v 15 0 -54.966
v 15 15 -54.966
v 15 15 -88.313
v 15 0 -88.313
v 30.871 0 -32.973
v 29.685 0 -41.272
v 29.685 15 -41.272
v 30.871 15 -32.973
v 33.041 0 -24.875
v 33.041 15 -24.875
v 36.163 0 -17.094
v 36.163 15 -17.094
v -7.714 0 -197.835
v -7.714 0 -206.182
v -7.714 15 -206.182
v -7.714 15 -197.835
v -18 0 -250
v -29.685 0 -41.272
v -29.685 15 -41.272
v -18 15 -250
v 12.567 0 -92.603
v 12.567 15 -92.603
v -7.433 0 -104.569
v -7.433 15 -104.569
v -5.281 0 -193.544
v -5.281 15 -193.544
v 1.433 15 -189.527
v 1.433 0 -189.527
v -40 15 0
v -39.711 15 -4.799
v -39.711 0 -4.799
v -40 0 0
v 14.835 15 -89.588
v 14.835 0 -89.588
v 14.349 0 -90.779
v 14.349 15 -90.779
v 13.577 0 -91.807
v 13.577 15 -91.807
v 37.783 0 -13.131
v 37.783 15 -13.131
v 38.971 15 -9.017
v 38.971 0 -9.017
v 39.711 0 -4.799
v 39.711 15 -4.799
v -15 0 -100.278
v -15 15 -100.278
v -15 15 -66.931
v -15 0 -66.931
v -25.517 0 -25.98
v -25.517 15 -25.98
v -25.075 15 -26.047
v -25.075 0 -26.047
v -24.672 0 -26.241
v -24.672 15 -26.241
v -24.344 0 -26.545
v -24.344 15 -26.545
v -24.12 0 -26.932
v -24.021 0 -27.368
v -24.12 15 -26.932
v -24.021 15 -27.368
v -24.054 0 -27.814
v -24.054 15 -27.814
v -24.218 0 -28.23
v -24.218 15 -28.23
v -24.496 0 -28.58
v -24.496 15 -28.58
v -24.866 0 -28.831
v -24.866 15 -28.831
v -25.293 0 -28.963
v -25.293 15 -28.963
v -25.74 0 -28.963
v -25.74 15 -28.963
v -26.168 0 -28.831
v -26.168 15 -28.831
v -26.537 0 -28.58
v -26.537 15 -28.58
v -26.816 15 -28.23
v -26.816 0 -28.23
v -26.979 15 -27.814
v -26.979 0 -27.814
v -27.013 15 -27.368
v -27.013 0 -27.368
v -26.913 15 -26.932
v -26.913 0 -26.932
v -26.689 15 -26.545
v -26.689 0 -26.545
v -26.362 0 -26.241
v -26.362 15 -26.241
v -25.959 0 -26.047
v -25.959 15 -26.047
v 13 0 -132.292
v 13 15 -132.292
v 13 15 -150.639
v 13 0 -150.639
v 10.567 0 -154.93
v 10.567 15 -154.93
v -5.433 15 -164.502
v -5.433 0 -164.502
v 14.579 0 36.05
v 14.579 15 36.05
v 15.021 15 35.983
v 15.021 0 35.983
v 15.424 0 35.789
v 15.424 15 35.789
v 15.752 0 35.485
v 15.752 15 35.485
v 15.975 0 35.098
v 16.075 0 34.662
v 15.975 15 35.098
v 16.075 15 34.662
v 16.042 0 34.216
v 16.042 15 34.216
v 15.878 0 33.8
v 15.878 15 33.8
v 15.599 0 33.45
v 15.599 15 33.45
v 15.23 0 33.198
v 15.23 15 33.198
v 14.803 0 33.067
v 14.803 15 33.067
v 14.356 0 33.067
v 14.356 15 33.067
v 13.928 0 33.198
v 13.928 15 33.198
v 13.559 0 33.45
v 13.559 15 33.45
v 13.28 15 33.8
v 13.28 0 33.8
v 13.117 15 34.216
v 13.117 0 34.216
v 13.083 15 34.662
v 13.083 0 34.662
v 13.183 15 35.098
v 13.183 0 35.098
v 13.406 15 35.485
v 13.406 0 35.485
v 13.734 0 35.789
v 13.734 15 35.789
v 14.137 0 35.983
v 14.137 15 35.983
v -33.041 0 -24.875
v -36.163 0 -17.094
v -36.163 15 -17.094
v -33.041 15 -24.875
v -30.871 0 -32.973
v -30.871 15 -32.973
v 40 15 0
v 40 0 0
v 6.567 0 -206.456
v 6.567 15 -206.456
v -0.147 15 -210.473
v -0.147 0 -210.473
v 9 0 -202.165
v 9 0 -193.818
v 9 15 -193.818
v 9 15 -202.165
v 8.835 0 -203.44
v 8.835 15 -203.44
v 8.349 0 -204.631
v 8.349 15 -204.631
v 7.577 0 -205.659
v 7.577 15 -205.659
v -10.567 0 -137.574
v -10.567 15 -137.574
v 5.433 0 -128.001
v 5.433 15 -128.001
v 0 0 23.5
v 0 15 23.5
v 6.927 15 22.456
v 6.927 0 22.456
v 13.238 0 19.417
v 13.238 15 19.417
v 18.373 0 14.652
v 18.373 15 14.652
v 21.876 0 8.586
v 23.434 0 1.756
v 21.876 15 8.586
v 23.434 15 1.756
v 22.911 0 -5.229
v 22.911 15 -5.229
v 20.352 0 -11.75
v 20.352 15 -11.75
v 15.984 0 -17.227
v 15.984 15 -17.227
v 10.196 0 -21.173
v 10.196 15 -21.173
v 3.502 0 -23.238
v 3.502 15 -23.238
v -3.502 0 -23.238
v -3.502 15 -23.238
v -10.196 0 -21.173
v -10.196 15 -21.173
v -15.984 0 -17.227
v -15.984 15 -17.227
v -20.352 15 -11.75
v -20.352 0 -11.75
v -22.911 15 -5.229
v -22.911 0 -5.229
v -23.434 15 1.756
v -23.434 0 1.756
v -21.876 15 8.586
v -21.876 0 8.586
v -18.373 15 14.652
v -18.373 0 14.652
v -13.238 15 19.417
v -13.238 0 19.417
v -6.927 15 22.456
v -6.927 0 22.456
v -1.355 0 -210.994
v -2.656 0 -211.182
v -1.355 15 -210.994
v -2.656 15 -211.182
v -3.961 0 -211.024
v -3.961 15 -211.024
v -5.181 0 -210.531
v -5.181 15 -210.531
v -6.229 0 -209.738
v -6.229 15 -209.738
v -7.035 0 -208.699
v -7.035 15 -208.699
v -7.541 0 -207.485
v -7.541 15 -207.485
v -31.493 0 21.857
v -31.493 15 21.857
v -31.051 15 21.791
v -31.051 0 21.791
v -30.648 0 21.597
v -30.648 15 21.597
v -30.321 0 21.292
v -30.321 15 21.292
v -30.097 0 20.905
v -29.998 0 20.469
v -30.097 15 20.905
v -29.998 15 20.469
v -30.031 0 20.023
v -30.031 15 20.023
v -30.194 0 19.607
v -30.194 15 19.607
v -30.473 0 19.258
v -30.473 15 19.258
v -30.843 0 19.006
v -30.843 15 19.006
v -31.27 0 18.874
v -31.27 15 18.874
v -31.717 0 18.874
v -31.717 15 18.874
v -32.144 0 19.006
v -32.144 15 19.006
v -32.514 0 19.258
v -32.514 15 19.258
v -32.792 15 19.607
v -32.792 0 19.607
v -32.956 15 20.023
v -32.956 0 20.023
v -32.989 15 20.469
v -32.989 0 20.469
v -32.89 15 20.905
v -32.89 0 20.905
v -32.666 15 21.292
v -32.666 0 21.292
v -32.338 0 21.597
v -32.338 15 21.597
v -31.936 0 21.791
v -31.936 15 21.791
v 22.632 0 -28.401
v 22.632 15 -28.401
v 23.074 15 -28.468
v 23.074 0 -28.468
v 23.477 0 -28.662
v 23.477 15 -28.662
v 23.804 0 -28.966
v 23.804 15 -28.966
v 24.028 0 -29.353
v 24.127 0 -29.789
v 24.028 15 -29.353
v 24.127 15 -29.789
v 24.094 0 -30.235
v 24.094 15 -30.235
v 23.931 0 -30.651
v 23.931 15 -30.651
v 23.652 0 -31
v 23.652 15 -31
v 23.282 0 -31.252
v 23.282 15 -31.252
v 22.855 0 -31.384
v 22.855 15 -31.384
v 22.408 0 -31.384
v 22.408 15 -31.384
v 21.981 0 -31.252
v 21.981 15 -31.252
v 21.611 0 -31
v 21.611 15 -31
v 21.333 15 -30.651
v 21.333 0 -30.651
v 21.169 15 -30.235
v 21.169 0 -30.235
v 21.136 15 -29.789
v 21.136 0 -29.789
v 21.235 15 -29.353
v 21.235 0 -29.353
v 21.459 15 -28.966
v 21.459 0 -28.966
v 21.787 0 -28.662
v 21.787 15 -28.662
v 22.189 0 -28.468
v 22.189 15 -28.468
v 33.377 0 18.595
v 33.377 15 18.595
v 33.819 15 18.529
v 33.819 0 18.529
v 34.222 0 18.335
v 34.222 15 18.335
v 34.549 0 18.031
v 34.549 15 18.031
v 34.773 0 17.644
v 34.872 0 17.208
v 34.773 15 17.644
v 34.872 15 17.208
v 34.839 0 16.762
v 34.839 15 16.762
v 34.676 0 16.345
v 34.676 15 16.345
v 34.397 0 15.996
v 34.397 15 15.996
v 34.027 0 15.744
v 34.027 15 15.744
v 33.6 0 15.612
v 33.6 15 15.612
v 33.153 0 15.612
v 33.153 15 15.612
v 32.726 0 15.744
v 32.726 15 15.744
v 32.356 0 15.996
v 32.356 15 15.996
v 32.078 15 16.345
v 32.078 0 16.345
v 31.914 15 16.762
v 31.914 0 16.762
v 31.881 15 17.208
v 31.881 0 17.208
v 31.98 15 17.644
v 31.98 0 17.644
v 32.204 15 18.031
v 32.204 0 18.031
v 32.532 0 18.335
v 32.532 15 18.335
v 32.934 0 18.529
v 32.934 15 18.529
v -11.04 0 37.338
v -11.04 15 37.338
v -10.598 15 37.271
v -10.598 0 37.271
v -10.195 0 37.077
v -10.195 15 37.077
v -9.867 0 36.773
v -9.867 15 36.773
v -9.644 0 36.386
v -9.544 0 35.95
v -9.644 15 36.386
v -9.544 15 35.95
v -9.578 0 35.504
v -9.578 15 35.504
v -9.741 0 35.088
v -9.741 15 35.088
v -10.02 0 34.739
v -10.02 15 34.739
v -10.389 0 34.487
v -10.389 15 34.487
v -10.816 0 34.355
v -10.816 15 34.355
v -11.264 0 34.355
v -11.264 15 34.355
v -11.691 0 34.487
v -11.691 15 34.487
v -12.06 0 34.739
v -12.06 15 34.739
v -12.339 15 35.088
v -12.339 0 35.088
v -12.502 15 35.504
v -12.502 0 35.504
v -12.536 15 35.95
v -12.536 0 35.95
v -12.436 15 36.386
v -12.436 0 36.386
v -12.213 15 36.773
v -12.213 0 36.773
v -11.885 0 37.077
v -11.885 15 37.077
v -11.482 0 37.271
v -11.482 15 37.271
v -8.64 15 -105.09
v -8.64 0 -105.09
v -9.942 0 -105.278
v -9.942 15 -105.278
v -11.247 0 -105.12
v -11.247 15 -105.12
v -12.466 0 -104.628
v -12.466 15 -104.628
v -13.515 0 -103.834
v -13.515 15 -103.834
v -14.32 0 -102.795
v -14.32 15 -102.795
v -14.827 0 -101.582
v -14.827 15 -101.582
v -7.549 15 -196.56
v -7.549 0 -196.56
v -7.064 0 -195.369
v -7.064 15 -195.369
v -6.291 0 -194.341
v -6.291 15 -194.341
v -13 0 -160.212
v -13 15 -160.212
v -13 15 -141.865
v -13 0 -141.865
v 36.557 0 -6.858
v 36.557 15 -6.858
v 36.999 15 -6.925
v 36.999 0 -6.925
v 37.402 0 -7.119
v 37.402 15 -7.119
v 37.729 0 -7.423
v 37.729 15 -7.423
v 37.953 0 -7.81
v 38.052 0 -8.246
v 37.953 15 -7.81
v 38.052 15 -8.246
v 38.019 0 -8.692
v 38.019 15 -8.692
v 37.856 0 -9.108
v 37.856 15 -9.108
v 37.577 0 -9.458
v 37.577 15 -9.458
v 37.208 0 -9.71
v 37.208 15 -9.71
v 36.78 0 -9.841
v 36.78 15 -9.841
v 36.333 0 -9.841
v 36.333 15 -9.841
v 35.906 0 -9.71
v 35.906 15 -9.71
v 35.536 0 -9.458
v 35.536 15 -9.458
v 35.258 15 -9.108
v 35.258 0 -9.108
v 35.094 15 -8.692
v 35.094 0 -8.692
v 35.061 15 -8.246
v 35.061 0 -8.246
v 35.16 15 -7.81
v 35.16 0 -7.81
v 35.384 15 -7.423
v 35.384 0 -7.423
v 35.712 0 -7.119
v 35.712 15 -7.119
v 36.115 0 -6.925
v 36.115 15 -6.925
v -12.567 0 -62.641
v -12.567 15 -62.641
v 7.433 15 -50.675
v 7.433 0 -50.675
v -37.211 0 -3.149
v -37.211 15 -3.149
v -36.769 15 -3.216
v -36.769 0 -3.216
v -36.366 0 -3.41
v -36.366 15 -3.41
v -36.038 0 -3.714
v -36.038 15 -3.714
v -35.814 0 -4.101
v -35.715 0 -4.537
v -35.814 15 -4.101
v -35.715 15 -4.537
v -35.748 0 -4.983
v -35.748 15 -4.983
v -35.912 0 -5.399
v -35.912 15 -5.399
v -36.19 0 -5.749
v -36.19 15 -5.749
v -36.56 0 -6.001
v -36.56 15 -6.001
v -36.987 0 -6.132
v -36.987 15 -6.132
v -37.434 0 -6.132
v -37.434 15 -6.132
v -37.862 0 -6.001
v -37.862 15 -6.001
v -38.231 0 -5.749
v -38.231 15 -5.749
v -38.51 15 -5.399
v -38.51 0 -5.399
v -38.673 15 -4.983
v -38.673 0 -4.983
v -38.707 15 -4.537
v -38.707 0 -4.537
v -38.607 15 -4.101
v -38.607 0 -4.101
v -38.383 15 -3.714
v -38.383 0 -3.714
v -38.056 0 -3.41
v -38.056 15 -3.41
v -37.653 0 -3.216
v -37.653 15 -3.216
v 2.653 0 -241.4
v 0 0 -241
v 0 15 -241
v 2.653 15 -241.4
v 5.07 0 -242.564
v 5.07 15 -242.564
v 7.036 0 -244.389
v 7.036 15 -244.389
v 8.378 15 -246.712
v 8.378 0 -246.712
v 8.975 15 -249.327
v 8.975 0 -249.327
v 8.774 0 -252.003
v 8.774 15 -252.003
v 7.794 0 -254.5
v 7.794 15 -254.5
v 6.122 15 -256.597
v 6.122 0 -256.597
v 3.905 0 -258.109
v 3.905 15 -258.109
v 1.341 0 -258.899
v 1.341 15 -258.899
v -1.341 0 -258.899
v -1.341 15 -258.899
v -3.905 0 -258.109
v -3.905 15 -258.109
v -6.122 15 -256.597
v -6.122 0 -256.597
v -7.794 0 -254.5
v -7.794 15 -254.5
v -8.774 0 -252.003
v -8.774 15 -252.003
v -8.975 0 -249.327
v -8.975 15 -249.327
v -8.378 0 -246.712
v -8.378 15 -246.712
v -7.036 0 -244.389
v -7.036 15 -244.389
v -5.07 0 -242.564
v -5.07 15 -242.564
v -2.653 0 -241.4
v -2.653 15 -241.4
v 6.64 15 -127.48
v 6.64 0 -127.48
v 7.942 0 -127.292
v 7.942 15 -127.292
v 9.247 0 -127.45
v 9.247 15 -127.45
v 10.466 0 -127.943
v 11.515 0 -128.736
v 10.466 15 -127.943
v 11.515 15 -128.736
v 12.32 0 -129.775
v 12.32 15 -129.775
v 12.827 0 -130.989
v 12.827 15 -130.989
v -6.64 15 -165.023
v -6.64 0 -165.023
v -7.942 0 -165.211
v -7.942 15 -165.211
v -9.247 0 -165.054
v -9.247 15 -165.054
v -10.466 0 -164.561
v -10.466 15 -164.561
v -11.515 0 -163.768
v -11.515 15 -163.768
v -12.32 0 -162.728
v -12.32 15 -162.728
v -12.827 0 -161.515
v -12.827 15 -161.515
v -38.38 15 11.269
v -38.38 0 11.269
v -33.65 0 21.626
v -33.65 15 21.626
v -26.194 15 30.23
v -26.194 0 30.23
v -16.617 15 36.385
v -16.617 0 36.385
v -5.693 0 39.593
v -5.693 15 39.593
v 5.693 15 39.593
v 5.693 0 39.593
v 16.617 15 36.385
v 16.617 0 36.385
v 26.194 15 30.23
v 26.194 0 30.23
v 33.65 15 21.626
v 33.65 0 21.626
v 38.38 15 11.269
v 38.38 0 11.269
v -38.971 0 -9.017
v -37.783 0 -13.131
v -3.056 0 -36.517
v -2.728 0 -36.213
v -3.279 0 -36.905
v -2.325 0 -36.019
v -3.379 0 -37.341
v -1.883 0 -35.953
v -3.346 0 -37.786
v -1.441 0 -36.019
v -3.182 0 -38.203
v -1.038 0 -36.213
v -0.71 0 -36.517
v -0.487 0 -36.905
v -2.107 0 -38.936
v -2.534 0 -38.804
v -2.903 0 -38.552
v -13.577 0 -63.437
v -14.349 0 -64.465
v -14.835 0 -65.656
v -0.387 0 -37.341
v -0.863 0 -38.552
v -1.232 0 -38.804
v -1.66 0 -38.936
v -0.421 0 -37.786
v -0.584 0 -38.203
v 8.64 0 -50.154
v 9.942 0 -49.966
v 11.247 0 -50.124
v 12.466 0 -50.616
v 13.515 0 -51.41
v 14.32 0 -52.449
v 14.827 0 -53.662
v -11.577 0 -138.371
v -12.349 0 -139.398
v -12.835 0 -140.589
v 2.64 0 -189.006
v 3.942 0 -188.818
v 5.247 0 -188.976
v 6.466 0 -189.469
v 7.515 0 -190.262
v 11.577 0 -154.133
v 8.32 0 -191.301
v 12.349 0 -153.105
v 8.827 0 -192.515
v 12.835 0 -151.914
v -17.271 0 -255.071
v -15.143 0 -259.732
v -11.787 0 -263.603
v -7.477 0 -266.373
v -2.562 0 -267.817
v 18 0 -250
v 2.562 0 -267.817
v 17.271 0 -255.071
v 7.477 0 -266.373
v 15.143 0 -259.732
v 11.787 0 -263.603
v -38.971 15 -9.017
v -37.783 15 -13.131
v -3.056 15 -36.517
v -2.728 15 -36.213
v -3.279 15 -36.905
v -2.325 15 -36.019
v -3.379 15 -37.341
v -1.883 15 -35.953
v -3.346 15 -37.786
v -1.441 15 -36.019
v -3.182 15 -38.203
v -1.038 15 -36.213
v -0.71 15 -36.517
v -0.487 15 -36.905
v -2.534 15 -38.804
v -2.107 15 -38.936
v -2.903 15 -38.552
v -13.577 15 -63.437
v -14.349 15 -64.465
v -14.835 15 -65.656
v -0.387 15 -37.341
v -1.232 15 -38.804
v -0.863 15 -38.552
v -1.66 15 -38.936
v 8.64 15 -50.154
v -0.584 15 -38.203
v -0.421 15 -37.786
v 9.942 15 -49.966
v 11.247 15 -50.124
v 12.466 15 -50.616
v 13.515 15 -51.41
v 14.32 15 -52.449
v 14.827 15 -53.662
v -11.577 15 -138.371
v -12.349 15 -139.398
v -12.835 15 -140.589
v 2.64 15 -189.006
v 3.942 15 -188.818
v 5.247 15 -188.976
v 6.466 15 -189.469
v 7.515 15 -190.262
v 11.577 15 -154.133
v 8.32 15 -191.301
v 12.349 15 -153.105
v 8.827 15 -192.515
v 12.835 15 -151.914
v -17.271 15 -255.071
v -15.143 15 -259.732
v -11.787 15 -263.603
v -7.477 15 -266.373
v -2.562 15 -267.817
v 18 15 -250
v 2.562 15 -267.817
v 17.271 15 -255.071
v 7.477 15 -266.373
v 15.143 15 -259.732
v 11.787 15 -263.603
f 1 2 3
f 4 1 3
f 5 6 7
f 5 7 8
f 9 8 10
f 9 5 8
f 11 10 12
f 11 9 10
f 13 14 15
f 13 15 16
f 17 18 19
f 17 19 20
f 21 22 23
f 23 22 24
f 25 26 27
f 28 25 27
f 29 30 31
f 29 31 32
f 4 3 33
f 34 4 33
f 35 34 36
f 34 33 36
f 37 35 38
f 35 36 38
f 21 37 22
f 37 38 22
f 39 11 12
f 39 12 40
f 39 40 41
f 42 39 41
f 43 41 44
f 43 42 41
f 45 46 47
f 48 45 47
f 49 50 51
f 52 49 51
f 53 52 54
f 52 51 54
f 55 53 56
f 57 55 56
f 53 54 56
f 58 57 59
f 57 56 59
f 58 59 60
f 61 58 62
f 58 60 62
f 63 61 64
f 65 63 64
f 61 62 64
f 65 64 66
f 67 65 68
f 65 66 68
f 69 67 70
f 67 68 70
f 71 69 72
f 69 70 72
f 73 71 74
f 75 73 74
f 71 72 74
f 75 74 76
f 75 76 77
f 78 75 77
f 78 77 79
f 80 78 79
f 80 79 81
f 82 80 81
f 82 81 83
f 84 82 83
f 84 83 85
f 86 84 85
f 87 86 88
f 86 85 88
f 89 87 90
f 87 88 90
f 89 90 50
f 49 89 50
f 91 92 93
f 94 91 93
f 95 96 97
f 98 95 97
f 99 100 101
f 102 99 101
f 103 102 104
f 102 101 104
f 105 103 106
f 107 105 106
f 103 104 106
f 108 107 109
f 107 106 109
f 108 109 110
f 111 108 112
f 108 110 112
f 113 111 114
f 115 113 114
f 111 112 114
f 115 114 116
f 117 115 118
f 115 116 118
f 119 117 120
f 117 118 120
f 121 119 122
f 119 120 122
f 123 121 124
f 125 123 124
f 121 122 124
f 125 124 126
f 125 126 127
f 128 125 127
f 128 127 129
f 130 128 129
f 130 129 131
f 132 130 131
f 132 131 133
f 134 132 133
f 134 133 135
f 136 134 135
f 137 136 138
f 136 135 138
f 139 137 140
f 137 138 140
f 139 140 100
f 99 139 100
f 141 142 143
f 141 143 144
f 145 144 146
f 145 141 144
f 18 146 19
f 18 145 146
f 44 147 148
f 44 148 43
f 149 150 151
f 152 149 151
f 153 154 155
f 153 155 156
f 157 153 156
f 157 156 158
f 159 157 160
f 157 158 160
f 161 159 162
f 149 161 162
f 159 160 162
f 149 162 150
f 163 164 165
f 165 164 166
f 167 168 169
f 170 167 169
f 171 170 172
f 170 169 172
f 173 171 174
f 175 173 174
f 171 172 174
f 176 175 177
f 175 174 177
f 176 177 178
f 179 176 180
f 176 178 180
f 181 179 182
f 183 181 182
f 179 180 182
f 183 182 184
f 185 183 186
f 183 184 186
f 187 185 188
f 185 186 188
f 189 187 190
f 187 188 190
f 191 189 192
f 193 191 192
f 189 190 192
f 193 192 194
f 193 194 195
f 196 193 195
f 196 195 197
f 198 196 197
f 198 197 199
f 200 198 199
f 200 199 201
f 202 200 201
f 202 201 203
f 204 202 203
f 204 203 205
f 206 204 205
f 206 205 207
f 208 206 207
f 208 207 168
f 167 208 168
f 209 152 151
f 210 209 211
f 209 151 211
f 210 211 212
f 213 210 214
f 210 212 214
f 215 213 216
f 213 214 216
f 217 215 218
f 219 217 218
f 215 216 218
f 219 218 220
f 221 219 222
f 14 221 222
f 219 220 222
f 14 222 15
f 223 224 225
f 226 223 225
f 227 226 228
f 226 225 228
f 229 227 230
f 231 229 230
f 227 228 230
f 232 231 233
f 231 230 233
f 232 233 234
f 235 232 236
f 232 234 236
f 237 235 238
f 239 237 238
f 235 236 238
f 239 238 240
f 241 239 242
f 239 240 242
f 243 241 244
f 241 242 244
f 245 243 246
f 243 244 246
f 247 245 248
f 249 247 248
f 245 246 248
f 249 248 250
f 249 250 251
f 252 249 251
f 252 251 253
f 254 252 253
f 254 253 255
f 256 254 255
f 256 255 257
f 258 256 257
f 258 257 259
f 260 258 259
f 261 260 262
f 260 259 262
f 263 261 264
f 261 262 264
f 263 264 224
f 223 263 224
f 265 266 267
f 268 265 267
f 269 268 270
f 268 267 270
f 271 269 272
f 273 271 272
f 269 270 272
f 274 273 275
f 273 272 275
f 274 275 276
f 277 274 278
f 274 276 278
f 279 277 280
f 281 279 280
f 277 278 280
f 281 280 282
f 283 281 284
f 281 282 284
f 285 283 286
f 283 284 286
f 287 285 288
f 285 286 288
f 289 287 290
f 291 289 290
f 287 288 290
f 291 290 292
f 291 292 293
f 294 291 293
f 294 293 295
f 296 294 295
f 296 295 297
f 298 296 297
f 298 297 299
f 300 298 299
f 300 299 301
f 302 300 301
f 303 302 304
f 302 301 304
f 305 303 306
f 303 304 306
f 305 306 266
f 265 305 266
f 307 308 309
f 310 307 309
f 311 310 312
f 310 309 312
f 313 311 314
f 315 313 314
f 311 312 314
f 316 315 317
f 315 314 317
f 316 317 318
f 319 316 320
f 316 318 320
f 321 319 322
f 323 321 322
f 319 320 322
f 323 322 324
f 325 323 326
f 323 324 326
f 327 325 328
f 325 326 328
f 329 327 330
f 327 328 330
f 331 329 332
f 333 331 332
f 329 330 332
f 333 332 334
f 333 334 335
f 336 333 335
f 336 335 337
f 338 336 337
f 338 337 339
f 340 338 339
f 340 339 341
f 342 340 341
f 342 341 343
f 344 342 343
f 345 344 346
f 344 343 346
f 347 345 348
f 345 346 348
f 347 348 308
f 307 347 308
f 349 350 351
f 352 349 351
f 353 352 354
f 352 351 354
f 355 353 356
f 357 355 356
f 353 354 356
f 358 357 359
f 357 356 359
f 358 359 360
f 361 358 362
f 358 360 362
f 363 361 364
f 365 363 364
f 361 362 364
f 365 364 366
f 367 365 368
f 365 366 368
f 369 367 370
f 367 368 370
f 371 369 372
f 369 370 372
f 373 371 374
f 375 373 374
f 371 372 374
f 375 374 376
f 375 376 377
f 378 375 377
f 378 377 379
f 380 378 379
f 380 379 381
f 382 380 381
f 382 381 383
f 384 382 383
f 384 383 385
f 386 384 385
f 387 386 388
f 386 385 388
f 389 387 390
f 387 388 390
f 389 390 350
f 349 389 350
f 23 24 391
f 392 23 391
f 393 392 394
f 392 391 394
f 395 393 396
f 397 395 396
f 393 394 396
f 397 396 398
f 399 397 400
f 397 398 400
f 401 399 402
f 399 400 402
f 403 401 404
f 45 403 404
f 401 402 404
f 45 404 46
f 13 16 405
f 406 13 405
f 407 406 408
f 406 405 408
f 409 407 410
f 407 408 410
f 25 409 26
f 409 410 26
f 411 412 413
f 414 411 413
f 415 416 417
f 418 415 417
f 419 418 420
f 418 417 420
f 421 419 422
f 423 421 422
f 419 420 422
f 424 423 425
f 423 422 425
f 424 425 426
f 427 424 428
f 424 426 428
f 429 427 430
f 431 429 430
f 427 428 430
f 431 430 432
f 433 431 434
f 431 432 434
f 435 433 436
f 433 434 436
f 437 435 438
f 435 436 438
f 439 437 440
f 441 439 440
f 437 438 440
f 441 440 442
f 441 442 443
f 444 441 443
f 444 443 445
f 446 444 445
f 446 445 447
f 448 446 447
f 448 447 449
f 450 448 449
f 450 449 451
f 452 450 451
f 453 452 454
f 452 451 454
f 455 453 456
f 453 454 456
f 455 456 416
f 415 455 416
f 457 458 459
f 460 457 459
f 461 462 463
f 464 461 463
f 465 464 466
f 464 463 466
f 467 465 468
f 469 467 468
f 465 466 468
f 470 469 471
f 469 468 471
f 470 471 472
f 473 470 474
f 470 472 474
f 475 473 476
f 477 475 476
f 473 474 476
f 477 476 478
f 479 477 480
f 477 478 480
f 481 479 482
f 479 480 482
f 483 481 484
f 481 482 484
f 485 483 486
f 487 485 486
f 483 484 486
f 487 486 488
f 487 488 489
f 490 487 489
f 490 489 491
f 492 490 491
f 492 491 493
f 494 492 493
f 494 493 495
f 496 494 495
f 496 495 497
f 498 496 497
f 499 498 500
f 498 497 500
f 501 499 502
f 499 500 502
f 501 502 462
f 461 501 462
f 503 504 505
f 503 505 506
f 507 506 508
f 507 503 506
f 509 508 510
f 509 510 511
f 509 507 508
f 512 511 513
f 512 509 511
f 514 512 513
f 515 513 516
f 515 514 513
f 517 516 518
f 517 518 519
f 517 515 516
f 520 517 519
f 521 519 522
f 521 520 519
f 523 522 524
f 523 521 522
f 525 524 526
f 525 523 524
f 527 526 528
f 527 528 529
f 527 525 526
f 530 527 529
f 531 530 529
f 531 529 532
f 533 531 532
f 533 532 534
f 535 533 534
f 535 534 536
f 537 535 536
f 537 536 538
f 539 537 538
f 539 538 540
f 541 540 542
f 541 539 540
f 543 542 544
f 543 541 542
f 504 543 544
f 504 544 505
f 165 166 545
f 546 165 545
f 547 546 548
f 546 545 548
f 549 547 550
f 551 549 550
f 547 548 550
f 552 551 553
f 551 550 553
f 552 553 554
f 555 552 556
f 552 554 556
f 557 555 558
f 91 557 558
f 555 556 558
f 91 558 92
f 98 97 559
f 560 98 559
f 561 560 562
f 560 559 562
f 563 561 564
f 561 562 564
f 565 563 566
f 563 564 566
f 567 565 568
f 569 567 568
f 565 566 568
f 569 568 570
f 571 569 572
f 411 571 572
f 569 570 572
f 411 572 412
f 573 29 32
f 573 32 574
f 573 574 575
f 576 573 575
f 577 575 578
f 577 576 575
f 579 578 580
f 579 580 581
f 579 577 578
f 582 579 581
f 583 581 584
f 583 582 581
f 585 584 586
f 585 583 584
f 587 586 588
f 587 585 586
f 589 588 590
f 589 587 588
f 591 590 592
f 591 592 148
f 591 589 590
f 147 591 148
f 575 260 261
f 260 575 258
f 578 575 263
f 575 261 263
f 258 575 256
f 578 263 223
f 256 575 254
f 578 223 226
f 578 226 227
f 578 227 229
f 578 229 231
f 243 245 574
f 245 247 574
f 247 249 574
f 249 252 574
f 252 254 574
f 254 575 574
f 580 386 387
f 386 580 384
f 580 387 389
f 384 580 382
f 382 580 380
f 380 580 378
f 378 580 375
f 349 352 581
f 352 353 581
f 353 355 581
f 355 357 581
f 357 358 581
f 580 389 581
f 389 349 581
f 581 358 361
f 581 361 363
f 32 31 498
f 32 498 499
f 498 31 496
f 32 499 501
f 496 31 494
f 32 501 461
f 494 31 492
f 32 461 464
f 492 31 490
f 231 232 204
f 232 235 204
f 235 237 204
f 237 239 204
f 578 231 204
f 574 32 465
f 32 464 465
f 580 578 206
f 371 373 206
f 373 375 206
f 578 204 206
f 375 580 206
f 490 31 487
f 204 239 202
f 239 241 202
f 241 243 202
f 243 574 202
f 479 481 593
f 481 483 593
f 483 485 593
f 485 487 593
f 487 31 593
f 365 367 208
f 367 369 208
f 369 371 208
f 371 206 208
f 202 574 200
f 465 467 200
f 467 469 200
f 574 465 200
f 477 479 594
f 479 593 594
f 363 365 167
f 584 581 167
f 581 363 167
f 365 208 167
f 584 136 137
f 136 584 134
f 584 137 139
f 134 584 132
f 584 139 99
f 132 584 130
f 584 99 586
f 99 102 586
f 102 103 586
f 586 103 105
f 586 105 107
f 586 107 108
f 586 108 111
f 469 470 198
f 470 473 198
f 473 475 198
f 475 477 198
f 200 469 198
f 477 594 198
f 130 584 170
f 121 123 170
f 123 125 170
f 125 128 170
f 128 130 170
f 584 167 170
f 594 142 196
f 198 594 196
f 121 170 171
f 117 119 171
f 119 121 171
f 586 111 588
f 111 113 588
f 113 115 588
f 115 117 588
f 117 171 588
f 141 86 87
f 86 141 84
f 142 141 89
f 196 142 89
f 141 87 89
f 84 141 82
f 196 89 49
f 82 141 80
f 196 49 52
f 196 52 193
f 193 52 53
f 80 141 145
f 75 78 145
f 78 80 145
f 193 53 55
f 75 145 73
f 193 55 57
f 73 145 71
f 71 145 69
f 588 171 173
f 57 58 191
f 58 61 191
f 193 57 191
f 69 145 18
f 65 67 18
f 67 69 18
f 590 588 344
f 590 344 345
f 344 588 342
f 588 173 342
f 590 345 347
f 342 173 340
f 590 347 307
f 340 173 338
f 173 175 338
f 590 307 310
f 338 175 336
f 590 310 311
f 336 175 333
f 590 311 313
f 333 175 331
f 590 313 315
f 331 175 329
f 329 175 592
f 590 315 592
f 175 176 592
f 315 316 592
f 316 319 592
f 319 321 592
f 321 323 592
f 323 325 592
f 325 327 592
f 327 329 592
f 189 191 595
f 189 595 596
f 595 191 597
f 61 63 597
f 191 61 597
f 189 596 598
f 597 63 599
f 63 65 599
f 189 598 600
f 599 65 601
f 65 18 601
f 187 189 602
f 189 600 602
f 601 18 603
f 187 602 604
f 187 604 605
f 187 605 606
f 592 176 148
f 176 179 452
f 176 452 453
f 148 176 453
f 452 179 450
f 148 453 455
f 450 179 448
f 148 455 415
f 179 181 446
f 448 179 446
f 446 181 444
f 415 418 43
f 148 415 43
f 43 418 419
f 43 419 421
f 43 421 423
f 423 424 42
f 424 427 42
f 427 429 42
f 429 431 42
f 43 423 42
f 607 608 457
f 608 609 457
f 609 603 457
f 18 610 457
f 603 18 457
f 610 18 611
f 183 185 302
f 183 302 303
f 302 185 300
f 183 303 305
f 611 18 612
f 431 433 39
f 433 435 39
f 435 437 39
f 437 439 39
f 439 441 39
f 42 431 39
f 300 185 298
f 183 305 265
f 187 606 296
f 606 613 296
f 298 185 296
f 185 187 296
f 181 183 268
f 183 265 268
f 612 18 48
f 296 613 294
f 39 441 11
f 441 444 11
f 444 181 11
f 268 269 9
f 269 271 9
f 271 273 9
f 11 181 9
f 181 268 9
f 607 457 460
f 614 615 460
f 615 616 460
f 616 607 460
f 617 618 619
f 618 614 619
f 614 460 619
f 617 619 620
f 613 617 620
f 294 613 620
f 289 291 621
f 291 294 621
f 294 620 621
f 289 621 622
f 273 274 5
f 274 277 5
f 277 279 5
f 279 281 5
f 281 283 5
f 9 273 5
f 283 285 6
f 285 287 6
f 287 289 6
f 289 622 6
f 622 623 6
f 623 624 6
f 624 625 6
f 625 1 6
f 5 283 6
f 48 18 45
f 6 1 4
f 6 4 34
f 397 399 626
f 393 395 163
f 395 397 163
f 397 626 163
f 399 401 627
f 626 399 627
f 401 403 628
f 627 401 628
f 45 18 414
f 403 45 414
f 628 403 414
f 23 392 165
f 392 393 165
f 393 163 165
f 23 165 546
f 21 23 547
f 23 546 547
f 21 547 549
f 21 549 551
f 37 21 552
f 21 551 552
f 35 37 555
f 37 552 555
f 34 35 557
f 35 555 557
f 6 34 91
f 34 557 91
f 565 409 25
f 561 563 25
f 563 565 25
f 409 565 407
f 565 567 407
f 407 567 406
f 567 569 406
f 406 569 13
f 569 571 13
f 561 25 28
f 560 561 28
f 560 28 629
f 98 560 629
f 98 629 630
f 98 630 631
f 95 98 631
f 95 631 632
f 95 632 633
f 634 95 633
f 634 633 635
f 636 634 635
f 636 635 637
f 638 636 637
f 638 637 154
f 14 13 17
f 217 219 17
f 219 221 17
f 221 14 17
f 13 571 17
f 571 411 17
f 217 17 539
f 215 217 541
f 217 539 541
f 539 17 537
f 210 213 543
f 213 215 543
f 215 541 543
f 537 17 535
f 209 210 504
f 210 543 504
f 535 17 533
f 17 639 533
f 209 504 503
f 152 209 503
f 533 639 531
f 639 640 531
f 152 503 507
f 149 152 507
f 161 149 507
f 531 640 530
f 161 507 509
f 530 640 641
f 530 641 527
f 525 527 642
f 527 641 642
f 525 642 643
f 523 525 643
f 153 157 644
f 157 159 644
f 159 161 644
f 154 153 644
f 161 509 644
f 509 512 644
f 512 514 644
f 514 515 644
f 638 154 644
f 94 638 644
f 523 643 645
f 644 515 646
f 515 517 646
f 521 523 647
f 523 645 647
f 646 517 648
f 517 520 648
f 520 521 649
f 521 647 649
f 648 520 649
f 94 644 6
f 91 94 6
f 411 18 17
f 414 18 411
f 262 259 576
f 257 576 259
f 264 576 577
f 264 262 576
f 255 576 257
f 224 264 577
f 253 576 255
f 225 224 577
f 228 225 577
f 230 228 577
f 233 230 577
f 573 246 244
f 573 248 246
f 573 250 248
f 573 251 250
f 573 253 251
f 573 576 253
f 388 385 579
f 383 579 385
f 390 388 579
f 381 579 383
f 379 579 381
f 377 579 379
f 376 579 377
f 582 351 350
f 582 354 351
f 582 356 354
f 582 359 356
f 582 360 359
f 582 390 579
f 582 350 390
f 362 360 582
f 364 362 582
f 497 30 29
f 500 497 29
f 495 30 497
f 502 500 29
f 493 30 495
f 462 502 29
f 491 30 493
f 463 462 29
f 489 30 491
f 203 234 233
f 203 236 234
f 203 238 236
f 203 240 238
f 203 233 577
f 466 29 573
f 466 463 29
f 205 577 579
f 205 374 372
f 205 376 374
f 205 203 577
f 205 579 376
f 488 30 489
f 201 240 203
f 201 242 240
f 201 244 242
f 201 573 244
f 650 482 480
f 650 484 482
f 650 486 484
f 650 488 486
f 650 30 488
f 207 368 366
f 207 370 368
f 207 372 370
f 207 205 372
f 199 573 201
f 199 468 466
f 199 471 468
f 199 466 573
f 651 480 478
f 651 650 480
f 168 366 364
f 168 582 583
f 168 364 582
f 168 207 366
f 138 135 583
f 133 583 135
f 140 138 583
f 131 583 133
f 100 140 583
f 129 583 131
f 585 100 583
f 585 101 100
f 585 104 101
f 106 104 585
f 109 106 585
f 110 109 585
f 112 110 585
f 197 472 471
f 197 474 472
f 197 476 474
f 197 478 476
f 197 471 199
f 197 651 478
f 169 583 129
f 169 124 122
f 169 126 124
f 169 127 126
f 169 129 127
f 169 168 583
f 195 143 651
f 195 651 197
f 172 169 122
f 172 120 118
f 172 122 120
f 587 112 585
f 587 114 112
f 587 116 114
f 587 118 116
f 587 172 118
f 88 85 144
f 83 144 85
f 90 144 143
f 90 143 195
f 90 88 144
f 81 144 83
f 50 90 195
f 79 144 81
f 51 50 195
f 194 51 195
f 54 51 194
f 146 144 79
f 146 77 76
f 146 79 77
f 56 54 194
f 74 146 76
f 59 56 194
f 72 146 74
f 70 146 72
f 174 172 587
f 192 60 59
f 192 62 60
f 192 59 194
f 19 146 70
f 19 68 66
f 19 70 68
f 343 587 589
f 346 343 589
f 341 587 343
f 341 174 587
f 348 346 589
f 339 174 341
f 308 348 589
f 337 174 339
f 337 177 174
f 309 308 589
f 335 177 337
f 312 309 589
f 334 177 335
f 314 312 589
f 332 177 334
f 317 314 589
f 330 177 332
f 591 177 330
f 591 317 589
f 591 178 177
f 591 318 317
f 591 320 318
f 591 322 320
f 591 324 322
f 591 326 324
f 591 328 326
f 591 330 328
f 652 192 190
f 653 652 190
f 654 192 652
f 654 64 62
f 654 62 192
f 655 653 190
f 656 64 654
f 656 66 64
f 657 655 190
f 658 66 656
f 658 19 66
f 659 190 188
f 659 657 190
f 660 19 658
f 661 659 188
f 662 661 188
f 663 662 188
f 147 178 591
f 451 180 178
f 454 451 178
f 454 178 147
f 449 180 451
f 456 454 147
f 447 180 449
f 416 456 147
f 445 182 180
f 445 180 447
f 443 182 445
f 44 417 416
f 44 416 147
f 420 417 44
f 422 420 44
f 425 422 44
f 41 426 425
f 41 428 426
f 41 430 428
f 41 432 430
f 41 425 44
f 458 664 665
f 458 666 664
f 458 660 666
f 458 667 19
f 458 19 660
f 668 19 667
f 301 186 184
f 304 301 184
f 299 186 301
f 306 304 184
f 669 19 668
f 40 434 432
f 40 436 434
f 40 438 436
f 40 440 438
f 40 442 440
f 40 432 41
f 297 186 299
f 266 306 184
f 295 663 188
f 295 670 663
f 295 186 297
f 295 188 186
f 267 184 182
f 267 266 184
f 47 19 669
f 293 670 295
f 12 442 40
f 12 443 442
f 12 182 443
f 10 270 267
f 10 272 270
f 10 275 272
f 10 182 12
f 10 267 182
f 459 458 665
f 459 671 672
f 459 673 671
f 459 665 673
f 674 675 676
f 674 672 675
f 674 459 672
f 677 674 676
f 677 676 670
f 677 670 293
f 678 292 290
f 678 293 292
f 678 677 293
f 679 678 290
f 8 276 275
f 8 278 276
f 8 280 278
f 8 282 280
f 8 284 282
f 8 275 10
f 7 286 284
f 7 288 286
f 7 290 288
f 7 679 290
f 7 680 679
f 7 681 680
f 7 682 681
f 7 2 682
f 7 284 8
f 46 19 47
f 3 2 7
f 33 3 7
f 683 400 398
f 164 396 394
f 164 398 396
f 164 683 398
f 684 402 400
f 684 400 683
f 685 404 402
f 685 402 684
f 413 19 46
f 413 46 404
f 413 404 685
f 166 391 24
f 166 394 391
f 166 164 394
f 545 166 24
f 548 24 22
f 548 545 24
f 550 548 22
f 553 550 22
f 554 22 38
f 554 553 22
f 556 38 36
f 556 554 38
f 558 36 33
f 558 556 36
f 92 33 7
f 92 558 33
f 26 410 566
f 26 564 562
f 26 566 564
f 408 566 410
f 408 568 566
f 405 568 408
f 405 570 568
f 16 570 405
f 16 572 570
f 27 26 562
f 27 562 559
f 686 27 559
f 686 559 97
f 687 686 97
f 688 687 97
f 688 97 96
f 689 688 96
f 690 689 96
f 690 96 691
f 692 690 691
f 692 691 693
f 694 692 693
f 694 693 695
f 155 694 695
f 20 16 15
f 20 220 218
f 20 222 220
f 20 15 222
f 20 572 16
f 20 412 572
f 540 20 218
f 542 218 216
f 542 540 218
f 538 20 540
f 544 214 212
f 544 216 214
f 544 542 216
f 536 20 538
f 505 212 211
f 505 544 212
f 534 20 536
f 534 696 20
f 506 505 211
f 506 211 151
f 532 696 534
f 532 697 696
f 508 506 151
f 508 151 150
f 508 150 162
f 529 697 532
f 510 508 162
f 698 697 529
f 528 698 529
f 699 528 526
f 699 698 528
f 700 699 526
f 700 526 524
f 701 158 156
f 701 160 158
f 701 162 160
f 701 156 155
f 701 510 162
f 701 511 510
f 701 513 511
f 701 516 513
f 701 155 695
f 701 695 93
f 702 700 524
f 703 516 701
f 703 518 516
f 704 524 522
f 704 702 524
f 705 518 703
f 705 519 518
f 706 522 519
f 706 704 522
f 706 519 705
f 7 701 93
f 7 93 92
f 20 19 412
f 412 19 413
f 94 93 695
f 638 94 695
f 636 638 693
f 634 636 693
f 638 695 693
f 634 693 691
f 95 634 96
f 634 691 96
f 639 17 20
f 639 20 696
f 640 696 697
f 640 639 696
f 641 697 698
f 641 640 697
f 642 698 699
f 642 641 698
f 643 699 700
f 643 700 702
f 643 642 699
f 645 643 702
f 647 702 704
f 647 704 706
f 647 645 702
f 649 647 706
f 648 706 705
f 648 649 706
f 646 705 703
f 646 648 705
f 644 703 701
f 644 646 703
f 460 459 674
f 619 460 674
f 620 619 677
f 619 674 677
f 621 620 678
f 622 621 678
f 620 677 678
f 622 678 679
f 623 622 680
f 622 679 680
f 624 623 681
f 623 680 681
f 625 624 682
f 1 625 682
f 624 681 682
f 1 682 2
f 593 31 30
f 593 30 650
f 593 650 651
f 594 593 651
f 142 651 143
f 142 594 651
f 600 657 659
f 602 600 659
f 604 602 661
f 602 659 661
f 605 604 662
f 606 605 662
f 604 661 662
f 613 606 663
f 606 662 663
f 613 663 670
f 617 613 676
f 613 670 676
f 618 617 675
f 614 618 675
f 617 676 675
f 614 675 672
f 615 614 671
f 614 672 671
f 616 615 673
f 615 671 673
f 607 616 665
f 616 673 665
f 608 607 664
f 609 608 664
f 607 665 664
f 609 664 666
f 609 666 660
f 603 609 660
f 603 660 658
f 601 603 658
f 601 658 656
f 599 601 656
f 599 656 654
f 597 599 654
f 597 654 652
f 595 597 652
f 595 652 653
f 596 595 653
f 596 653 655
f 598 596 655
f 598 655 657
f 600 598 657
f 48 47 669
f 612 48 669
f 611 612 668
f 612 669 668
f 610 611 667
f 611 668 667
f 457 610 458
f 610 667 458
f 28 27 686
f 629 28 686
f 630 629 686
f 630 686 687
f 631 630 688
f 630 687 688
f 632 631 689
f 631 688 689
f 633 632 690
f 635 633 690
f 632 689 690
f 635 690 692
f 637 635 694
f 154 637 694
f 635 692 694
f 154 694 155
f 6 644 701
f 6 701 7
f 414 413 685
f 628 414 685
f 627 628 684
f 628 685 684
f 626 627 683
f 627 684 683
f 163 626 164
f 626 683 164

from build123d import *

# Parameters (mm, degrees)
SKETCH_1_R          = 5.05
SKETCH_1_R_2        = 13
EXTRUDE_1_DEPTH     = 15
FILLET_1_R          = 3
SKETCH_7_R          = 2.05
CUT_EXTRUDE_4_DEPTH = 277.54113618
SKETCH_8_R          = 13
CUT_EXTRUDE_5_DEPTH = 277.54113618
SKETCH_9_R          = 25
SKETCH_9_R_2        = 13
EXTRUDE_4_DEPTH     = 15
SKETCH_10_R         = 1.5
EXTRUDE_5_DEPTH     = 15
EXTRUDE_START       = -15
SKETCH_14_R         = 13
SKETCH_14_R_2       = 9
EXTRUDE_6_DEPTH     = 15
SKETCH_13_R         = 23.5
SKETCH_13_R_2       = 1.5
CUT_EXTRUDE_6_DEPTH = 25
CUT_EXTRUDE_START   = -15
CUT_EXTRUDE_7_DEPTH = 15
EXTRUDE_9_DEPTH     = 15
CUT_EXTRUDE_8_DEPTH = 30


# Read off the part's stored shape, not the designer's step: 切除-拉伸7
with BuildPart() as part:
    # 草图1 → 凸台-拉伸1 (new body)
    with BuildSketch(Plane(origin=(0, 0, 0), x_dir=(1, 0, 0), z_dir=(0, 1, 0))):
        with BuildLine():
            Line((-17.992942616, -0.504), (-24.990198078, 249.3))
            ThreePointArc((-24.990198078, 249.3), (0, 275), (24.990198078, 249.3))
            Line((24.990198078, 249.3), (17.992942616, -0.504))
            ThreePointArc((17.992942616, -0.504), (0, -18), (-17.992942616, -0.504))
        make_face()
        with Locations(Location((0, 0, 0), (0, 0, 270))):
            Circle(SKETCH_1_R, mode=Mode.SUBTRACT)
        with Locations(Location((0, 250, 0), (0, 0, 270))):
            Circle(SKETCH_1_R_2, mode=Mode.SUBTRACT)
        Polygon((-16.444447487, 158.5), (-17.704941698, 203.5), (11.028871219, 137.174942267), align=None, mode=Mode.SUBTRACT)
        Polygon((15.954255294, 141), (18.475243716, 231), (-12, 219.5), align=None, mode=Mode.SUBTRACT)
    extrude(amount=EXTRUDE_1_DEPTH)

    # 圆角1
    fillet_1_edges = [part.edges().sort_by_distance(p)[0] for p in [
        (-16.444447487, 7.5, -158.5),
        (11.028871219, 7.5, -137.174942267),
        (-17.704941698, 7.5, -203.5),
        (18.475243716, 7.5, -231),
        (-12, 7.5, -219.5),
        (15.954255294, 7.5, -141),
    ]]
    fillet(fillet_1_edges, radius=FILLET_1_R)

    # 草图7 → 切除-拉伸4 (cut, through all)
    with BuildSketch(Plane(origin=(0, 15, 0), x_dir=(1, 0, 0), z_dir=(0, 1, 0))):
        with Locations(Location((15, 15, 0), (0, 0, 270))):
            Circle(SKETCH_7_R)
        with Locations(Location((-15, 15, 0), (0, 0, 270))):
            Circle(SKETCH_7_R)
        with Locations((-15, -15)):
            Circle(SKETCH_7_R)
        with Locations((15, -15)):
            Circle(SKETCH_7_R)
    extrude(amount=-CUT_EXTRUDE_4_DEPTH, mode=Mode.SUBTRACT)

    # 草图8 → 切除-拉伸5 (cut, through all)
    with BuildSketch(Plane(origin=(0, 15, 0), x_dir=(1, 0, 0), z_dir=(0, 1, 0))):
        with Locations(Location((0, 0, 0), (0, 0, 270))):
            Circle(SKETCH_8_R)
    extrude(amount=-CUT_EXTRUDE_5_DEPTH, mode=Mode.SUBTRACT)

    # 草图9 → 凸台-拉伸4 (add)
    with BuildSketch(Plane(origin=(0, 15, 0), x_dir=(1, 0, 0), z_dir=(0, 1, 0))):
        Circle(SKETCH_9_R)
        with Locations(Location((0, 0, 0), (0, 0, 270))):
            Circle(SKETCH_9_R_2, mode=Mode.SUBTRACT)
    extrude(amount=-EXTRUDE_4_DEPTH)

    # 草图10 → 凸台-拉伸5 (add)
    with BuildSketch(Plane(origin=(0, 15, 0), x_dir=(1, 0, 0), z_dir=(0, 1, 0))):
        with BuildLine():
            Line((-39.711049207, 4.799226071), (-40, 0))
            ThreePointArc((-40, 0), (0, -40), (40, 0))
            Line((40, 0), (39.711049207, 4.799226071))
            Line((39.711049207, 4.799226071), (24.990198078, 249.3))
            Line((24.990198078, 249.3), (18.993134598, 35.203136766))
            Line((18.993134598, 35.203136766), (18.478724461, 16.838549294))
            ThreePointArc((18.478724461, 16.838549294), (0, -25), (-18.478724461, 16.838549294))
            Line((-18.478724461, 16.838549294), (-18.993134598, 35.203136766))
            Line((-18.993134598, 35.203136766), (-24.990198078, 249.3))
            Line((-24.990198078, 249.3), (-39.711049207, 4.799226071))
        make_face()
        with Locations(Location((-31.493406412, -20.357194124, 0), (0, 0, 270))):
            Circle(SKETCH_10_R, mode=Mode.SUBTRACT)
        with Locations(Location((-37.210701127, 4.649055992, 0), (0, 0, 270))):
            Circle(SKETCH_10_R, mode=Mode.SUBTRACT)
        with Locations(Location((-25.516695234, 27.479961141, 0), (0, 0, 270))):
            Circle(SKETCH_10_R, mode=Mode.SUBTRACT)
        with Locations(Location((-11.039996826, -35.838086864, 0), (0, 0, 270))):
            Circle(SKETCH_10_R, mode=Mode.SUBTRACT)
        with Locations(Location((14.579149971, -34.549940465, 0), (0, 0, 270))):
            Circle(SKETCH_10_R, mode=Mode.SUBTRACT)
        with Locations(Location((33.376550467, -17.095492942, 0), (0, 0, 270))):
            Circle(SKETCH_10_R, mode=Mode.SUBTRACT)
        with Locations(Location((22.631551157, 29.900884473, 0), (0, 0, 270))):
            Circle(SKETCH_10_R, mode=Mode.SUBTRACT)
        with Locations(Location((36.55669206, 8.358125723, 0), (0, 0, 270))):
            Circle(SKETCH_10_R, mode=Mode.SUBTRACT)
    extrude(amount=-EXTRUDE_5_DEPTH)

    # 草图14 → 凸台-拉伸6 (add)
    with BuildSketch(Plane(origin=(0, 15, 0), x_dir=(1, 0, 0), z_dir=(0, 1, 0)).offset(EXTRUDE_START)):
        with Locations((0, 250)):
            Circle(SKETCH_14_R)
        with Locations(Location((0, 250, 0), (0, 0, 270))):
            Circle(SKETCH_14_R_2, mode=Mode.SUBTRACT)
    extrude(amount=EXTRUDE_6_DEPTH)

    # 草图13 → 切除-拉伸6 (cut)
    with BuildSketch(Plane(origin=(0, 15, 0), x_dir=(1, 0, 0), z_dir=(0, 1, 0))):
        with Locations(Location((0, 0, 0), (0, 0, 270))):
            Circle(SKETCH_13_R)
        with Locations(Location((-1.883144055, 37.452687066, 0), (0, 0, 270))):
            Circle(SKETCH_13_R_2)
    extrude(amount=-CUT_EXTRUDE_6_DEPTH, mode=Mode.SUBTRACT)

    # 切除-拉伸7 outline → 切除-拉伸7 (cut)
    with BuildSketch(Plane(origin=(0, 15, 0), x_dir=(1, 0, 0), z_dir=(0, 1, 0)).offset(CUT_EXTRUDE_START)):
        with BuildLine():
            ThreePointArc((-39.711049207, 4.799226071), (-38.432072473, 11.089445679), (-36.163406358, 17.094093734))
            ThreePointArc((-36.163406358, 17.094093734), (-31.834646693, 28.891099747), (-29.684840552, 41.271965817))
            Line((-29.684840552, 41.271965817), (-18, 250))
            ThreePointArc((-18, 250), (0, 268), (18, 250))
            Line((18, 250), (29.684856444, 41.271998774))
            ThreePointArc((29.684856444, 41.271998774), (31.834654407, 28.891107358), (36.163414547, 17.09407641))
            ThreePointArc((36.163414547, 17.09407641), (38.432075129, 11.089436474), (39.711049207, 4.799226071))
            Line((39.711049207, 4.799226071), (24.990198078, 249.3))
            ThreePointArc((24.990198078, 249.3), (0, 275), (-24.990198078, 249.3))
            Line((-24.990198078, 249.3), (-39.711049207, 4.799226071))
        make_face()
    extrude(amount=CUT_EXTRUDE_7_DEPTH, mode=Mode.SUBTRACT)

    # 草图18 → 凸台-拉伸9 (add)
    with BuildSketch(Plane(origin=(0, 0, 0), x_dir=(-1, 0, 0), z_dir=(0, -1, 0))):
        Polygon((-20.868155543, 131.844626328), (20.706902291, 152.097209515), (16.905995412, 230.591726078), (-18.51031166, 232.603381148), (-19.336560971, 196.02914685), align=None)
    extrude(amount=-EXTRUDE_9_DEPTH)

    # 草图19 → 切除-拉伸8 (cut)
    with BuildSketch(Plane(origin=(0, 15, 0), x_dir=(1, 0, 0), z_dir=(0, 1, 0))):
        with BuildLine():
            Line((-7.714285714, 206.181987904), (-7.714285714, 197.835106113))
            ThreePointArc((-7.714285714, 197.835106113), (-7.063735021, 195.368876049), (-5.281369423, 193.544409057))
            Line((-5.281369423, 193.544409057), (1.432916291, 189.52731504))
            ThreePointArc((1.432916291, 189.52731504), (6.466230064, 189.468562789), (9, 193.818012096))
            Line((9, 193.818012096), (9, 202.164893887))
            ThreePointArc((9, 202.164893887), (8.349449307, 204.631123951), (6.567083709, 206.455590943))
            Line((6.567083709, 206.455590943), (-0.147202005, 210.47268496))
            ThreePointArc((-0.147202005, 210.47268496), (-5.180515778, 210.531437211), (-7.714285714, 206.181987904))
        make_face()
        with BuildLine():
            Line((-13, 160.211585543), (-13, 141.864703752))
            ThreePointArc((-13, 141.864703752), (-12.349449307, 139.398473689), (-10.567083709, 137.574006696))
            Line((-10.567083709, 137.574006696), (5.432916291, 128.001357123))
            ThreePointArc((5.432916291, 128.001357123), (10.466230064, 127.942604873), (13, 132.29205418))
            Line((13, 132.29205418), (13, 150.63893597))
            ThreePointArc((13, 150.63893597), (12.349449307, 153.105166034), (10.567083709, 154.929633027))
            Line((10.567083709, 154.929633027), (-5.432916291, 164.5022826))
            ThreePointArc((-5.432916291, 164.5022826), (-10.466230064, 164.56103485), (-13, 160.211585543))
        make_face()
        with BuildLine():
            Line((-15, 100.278326449), (-15, 66.931444658))
            ThreePointArc((-15, 66.931444658), (-14.349449307, 64.465214594), (-12.567083709, 62.640747602))
            Line((-12.567083709, 62.640747602), (7.432916291, 50.674935636))
            ThreePointArc((7.432916291, 50.674935636), (12.466230064, 50.616183385), (15, 54.965632692))
            Line((15, 54.965632692), (15, 88.312514483))
            ThreePointArc((15, 88.312514483), (14.349449307, 90.778744547), (12.567083709, 92.60321154))
            Line((12.567083709, 92.60321154), (-7.432916291, 104.569023505))
            ThreePointArc((-7.432916291, 104.569023505), (-12.466230064, 104.627775756), (-15, 100.278326449))
        make_face()
    extrude(amount=-CUT_EXTRUDE_8_DEPTH, mode=Mode.SUBTRACT)


solid = part.part
